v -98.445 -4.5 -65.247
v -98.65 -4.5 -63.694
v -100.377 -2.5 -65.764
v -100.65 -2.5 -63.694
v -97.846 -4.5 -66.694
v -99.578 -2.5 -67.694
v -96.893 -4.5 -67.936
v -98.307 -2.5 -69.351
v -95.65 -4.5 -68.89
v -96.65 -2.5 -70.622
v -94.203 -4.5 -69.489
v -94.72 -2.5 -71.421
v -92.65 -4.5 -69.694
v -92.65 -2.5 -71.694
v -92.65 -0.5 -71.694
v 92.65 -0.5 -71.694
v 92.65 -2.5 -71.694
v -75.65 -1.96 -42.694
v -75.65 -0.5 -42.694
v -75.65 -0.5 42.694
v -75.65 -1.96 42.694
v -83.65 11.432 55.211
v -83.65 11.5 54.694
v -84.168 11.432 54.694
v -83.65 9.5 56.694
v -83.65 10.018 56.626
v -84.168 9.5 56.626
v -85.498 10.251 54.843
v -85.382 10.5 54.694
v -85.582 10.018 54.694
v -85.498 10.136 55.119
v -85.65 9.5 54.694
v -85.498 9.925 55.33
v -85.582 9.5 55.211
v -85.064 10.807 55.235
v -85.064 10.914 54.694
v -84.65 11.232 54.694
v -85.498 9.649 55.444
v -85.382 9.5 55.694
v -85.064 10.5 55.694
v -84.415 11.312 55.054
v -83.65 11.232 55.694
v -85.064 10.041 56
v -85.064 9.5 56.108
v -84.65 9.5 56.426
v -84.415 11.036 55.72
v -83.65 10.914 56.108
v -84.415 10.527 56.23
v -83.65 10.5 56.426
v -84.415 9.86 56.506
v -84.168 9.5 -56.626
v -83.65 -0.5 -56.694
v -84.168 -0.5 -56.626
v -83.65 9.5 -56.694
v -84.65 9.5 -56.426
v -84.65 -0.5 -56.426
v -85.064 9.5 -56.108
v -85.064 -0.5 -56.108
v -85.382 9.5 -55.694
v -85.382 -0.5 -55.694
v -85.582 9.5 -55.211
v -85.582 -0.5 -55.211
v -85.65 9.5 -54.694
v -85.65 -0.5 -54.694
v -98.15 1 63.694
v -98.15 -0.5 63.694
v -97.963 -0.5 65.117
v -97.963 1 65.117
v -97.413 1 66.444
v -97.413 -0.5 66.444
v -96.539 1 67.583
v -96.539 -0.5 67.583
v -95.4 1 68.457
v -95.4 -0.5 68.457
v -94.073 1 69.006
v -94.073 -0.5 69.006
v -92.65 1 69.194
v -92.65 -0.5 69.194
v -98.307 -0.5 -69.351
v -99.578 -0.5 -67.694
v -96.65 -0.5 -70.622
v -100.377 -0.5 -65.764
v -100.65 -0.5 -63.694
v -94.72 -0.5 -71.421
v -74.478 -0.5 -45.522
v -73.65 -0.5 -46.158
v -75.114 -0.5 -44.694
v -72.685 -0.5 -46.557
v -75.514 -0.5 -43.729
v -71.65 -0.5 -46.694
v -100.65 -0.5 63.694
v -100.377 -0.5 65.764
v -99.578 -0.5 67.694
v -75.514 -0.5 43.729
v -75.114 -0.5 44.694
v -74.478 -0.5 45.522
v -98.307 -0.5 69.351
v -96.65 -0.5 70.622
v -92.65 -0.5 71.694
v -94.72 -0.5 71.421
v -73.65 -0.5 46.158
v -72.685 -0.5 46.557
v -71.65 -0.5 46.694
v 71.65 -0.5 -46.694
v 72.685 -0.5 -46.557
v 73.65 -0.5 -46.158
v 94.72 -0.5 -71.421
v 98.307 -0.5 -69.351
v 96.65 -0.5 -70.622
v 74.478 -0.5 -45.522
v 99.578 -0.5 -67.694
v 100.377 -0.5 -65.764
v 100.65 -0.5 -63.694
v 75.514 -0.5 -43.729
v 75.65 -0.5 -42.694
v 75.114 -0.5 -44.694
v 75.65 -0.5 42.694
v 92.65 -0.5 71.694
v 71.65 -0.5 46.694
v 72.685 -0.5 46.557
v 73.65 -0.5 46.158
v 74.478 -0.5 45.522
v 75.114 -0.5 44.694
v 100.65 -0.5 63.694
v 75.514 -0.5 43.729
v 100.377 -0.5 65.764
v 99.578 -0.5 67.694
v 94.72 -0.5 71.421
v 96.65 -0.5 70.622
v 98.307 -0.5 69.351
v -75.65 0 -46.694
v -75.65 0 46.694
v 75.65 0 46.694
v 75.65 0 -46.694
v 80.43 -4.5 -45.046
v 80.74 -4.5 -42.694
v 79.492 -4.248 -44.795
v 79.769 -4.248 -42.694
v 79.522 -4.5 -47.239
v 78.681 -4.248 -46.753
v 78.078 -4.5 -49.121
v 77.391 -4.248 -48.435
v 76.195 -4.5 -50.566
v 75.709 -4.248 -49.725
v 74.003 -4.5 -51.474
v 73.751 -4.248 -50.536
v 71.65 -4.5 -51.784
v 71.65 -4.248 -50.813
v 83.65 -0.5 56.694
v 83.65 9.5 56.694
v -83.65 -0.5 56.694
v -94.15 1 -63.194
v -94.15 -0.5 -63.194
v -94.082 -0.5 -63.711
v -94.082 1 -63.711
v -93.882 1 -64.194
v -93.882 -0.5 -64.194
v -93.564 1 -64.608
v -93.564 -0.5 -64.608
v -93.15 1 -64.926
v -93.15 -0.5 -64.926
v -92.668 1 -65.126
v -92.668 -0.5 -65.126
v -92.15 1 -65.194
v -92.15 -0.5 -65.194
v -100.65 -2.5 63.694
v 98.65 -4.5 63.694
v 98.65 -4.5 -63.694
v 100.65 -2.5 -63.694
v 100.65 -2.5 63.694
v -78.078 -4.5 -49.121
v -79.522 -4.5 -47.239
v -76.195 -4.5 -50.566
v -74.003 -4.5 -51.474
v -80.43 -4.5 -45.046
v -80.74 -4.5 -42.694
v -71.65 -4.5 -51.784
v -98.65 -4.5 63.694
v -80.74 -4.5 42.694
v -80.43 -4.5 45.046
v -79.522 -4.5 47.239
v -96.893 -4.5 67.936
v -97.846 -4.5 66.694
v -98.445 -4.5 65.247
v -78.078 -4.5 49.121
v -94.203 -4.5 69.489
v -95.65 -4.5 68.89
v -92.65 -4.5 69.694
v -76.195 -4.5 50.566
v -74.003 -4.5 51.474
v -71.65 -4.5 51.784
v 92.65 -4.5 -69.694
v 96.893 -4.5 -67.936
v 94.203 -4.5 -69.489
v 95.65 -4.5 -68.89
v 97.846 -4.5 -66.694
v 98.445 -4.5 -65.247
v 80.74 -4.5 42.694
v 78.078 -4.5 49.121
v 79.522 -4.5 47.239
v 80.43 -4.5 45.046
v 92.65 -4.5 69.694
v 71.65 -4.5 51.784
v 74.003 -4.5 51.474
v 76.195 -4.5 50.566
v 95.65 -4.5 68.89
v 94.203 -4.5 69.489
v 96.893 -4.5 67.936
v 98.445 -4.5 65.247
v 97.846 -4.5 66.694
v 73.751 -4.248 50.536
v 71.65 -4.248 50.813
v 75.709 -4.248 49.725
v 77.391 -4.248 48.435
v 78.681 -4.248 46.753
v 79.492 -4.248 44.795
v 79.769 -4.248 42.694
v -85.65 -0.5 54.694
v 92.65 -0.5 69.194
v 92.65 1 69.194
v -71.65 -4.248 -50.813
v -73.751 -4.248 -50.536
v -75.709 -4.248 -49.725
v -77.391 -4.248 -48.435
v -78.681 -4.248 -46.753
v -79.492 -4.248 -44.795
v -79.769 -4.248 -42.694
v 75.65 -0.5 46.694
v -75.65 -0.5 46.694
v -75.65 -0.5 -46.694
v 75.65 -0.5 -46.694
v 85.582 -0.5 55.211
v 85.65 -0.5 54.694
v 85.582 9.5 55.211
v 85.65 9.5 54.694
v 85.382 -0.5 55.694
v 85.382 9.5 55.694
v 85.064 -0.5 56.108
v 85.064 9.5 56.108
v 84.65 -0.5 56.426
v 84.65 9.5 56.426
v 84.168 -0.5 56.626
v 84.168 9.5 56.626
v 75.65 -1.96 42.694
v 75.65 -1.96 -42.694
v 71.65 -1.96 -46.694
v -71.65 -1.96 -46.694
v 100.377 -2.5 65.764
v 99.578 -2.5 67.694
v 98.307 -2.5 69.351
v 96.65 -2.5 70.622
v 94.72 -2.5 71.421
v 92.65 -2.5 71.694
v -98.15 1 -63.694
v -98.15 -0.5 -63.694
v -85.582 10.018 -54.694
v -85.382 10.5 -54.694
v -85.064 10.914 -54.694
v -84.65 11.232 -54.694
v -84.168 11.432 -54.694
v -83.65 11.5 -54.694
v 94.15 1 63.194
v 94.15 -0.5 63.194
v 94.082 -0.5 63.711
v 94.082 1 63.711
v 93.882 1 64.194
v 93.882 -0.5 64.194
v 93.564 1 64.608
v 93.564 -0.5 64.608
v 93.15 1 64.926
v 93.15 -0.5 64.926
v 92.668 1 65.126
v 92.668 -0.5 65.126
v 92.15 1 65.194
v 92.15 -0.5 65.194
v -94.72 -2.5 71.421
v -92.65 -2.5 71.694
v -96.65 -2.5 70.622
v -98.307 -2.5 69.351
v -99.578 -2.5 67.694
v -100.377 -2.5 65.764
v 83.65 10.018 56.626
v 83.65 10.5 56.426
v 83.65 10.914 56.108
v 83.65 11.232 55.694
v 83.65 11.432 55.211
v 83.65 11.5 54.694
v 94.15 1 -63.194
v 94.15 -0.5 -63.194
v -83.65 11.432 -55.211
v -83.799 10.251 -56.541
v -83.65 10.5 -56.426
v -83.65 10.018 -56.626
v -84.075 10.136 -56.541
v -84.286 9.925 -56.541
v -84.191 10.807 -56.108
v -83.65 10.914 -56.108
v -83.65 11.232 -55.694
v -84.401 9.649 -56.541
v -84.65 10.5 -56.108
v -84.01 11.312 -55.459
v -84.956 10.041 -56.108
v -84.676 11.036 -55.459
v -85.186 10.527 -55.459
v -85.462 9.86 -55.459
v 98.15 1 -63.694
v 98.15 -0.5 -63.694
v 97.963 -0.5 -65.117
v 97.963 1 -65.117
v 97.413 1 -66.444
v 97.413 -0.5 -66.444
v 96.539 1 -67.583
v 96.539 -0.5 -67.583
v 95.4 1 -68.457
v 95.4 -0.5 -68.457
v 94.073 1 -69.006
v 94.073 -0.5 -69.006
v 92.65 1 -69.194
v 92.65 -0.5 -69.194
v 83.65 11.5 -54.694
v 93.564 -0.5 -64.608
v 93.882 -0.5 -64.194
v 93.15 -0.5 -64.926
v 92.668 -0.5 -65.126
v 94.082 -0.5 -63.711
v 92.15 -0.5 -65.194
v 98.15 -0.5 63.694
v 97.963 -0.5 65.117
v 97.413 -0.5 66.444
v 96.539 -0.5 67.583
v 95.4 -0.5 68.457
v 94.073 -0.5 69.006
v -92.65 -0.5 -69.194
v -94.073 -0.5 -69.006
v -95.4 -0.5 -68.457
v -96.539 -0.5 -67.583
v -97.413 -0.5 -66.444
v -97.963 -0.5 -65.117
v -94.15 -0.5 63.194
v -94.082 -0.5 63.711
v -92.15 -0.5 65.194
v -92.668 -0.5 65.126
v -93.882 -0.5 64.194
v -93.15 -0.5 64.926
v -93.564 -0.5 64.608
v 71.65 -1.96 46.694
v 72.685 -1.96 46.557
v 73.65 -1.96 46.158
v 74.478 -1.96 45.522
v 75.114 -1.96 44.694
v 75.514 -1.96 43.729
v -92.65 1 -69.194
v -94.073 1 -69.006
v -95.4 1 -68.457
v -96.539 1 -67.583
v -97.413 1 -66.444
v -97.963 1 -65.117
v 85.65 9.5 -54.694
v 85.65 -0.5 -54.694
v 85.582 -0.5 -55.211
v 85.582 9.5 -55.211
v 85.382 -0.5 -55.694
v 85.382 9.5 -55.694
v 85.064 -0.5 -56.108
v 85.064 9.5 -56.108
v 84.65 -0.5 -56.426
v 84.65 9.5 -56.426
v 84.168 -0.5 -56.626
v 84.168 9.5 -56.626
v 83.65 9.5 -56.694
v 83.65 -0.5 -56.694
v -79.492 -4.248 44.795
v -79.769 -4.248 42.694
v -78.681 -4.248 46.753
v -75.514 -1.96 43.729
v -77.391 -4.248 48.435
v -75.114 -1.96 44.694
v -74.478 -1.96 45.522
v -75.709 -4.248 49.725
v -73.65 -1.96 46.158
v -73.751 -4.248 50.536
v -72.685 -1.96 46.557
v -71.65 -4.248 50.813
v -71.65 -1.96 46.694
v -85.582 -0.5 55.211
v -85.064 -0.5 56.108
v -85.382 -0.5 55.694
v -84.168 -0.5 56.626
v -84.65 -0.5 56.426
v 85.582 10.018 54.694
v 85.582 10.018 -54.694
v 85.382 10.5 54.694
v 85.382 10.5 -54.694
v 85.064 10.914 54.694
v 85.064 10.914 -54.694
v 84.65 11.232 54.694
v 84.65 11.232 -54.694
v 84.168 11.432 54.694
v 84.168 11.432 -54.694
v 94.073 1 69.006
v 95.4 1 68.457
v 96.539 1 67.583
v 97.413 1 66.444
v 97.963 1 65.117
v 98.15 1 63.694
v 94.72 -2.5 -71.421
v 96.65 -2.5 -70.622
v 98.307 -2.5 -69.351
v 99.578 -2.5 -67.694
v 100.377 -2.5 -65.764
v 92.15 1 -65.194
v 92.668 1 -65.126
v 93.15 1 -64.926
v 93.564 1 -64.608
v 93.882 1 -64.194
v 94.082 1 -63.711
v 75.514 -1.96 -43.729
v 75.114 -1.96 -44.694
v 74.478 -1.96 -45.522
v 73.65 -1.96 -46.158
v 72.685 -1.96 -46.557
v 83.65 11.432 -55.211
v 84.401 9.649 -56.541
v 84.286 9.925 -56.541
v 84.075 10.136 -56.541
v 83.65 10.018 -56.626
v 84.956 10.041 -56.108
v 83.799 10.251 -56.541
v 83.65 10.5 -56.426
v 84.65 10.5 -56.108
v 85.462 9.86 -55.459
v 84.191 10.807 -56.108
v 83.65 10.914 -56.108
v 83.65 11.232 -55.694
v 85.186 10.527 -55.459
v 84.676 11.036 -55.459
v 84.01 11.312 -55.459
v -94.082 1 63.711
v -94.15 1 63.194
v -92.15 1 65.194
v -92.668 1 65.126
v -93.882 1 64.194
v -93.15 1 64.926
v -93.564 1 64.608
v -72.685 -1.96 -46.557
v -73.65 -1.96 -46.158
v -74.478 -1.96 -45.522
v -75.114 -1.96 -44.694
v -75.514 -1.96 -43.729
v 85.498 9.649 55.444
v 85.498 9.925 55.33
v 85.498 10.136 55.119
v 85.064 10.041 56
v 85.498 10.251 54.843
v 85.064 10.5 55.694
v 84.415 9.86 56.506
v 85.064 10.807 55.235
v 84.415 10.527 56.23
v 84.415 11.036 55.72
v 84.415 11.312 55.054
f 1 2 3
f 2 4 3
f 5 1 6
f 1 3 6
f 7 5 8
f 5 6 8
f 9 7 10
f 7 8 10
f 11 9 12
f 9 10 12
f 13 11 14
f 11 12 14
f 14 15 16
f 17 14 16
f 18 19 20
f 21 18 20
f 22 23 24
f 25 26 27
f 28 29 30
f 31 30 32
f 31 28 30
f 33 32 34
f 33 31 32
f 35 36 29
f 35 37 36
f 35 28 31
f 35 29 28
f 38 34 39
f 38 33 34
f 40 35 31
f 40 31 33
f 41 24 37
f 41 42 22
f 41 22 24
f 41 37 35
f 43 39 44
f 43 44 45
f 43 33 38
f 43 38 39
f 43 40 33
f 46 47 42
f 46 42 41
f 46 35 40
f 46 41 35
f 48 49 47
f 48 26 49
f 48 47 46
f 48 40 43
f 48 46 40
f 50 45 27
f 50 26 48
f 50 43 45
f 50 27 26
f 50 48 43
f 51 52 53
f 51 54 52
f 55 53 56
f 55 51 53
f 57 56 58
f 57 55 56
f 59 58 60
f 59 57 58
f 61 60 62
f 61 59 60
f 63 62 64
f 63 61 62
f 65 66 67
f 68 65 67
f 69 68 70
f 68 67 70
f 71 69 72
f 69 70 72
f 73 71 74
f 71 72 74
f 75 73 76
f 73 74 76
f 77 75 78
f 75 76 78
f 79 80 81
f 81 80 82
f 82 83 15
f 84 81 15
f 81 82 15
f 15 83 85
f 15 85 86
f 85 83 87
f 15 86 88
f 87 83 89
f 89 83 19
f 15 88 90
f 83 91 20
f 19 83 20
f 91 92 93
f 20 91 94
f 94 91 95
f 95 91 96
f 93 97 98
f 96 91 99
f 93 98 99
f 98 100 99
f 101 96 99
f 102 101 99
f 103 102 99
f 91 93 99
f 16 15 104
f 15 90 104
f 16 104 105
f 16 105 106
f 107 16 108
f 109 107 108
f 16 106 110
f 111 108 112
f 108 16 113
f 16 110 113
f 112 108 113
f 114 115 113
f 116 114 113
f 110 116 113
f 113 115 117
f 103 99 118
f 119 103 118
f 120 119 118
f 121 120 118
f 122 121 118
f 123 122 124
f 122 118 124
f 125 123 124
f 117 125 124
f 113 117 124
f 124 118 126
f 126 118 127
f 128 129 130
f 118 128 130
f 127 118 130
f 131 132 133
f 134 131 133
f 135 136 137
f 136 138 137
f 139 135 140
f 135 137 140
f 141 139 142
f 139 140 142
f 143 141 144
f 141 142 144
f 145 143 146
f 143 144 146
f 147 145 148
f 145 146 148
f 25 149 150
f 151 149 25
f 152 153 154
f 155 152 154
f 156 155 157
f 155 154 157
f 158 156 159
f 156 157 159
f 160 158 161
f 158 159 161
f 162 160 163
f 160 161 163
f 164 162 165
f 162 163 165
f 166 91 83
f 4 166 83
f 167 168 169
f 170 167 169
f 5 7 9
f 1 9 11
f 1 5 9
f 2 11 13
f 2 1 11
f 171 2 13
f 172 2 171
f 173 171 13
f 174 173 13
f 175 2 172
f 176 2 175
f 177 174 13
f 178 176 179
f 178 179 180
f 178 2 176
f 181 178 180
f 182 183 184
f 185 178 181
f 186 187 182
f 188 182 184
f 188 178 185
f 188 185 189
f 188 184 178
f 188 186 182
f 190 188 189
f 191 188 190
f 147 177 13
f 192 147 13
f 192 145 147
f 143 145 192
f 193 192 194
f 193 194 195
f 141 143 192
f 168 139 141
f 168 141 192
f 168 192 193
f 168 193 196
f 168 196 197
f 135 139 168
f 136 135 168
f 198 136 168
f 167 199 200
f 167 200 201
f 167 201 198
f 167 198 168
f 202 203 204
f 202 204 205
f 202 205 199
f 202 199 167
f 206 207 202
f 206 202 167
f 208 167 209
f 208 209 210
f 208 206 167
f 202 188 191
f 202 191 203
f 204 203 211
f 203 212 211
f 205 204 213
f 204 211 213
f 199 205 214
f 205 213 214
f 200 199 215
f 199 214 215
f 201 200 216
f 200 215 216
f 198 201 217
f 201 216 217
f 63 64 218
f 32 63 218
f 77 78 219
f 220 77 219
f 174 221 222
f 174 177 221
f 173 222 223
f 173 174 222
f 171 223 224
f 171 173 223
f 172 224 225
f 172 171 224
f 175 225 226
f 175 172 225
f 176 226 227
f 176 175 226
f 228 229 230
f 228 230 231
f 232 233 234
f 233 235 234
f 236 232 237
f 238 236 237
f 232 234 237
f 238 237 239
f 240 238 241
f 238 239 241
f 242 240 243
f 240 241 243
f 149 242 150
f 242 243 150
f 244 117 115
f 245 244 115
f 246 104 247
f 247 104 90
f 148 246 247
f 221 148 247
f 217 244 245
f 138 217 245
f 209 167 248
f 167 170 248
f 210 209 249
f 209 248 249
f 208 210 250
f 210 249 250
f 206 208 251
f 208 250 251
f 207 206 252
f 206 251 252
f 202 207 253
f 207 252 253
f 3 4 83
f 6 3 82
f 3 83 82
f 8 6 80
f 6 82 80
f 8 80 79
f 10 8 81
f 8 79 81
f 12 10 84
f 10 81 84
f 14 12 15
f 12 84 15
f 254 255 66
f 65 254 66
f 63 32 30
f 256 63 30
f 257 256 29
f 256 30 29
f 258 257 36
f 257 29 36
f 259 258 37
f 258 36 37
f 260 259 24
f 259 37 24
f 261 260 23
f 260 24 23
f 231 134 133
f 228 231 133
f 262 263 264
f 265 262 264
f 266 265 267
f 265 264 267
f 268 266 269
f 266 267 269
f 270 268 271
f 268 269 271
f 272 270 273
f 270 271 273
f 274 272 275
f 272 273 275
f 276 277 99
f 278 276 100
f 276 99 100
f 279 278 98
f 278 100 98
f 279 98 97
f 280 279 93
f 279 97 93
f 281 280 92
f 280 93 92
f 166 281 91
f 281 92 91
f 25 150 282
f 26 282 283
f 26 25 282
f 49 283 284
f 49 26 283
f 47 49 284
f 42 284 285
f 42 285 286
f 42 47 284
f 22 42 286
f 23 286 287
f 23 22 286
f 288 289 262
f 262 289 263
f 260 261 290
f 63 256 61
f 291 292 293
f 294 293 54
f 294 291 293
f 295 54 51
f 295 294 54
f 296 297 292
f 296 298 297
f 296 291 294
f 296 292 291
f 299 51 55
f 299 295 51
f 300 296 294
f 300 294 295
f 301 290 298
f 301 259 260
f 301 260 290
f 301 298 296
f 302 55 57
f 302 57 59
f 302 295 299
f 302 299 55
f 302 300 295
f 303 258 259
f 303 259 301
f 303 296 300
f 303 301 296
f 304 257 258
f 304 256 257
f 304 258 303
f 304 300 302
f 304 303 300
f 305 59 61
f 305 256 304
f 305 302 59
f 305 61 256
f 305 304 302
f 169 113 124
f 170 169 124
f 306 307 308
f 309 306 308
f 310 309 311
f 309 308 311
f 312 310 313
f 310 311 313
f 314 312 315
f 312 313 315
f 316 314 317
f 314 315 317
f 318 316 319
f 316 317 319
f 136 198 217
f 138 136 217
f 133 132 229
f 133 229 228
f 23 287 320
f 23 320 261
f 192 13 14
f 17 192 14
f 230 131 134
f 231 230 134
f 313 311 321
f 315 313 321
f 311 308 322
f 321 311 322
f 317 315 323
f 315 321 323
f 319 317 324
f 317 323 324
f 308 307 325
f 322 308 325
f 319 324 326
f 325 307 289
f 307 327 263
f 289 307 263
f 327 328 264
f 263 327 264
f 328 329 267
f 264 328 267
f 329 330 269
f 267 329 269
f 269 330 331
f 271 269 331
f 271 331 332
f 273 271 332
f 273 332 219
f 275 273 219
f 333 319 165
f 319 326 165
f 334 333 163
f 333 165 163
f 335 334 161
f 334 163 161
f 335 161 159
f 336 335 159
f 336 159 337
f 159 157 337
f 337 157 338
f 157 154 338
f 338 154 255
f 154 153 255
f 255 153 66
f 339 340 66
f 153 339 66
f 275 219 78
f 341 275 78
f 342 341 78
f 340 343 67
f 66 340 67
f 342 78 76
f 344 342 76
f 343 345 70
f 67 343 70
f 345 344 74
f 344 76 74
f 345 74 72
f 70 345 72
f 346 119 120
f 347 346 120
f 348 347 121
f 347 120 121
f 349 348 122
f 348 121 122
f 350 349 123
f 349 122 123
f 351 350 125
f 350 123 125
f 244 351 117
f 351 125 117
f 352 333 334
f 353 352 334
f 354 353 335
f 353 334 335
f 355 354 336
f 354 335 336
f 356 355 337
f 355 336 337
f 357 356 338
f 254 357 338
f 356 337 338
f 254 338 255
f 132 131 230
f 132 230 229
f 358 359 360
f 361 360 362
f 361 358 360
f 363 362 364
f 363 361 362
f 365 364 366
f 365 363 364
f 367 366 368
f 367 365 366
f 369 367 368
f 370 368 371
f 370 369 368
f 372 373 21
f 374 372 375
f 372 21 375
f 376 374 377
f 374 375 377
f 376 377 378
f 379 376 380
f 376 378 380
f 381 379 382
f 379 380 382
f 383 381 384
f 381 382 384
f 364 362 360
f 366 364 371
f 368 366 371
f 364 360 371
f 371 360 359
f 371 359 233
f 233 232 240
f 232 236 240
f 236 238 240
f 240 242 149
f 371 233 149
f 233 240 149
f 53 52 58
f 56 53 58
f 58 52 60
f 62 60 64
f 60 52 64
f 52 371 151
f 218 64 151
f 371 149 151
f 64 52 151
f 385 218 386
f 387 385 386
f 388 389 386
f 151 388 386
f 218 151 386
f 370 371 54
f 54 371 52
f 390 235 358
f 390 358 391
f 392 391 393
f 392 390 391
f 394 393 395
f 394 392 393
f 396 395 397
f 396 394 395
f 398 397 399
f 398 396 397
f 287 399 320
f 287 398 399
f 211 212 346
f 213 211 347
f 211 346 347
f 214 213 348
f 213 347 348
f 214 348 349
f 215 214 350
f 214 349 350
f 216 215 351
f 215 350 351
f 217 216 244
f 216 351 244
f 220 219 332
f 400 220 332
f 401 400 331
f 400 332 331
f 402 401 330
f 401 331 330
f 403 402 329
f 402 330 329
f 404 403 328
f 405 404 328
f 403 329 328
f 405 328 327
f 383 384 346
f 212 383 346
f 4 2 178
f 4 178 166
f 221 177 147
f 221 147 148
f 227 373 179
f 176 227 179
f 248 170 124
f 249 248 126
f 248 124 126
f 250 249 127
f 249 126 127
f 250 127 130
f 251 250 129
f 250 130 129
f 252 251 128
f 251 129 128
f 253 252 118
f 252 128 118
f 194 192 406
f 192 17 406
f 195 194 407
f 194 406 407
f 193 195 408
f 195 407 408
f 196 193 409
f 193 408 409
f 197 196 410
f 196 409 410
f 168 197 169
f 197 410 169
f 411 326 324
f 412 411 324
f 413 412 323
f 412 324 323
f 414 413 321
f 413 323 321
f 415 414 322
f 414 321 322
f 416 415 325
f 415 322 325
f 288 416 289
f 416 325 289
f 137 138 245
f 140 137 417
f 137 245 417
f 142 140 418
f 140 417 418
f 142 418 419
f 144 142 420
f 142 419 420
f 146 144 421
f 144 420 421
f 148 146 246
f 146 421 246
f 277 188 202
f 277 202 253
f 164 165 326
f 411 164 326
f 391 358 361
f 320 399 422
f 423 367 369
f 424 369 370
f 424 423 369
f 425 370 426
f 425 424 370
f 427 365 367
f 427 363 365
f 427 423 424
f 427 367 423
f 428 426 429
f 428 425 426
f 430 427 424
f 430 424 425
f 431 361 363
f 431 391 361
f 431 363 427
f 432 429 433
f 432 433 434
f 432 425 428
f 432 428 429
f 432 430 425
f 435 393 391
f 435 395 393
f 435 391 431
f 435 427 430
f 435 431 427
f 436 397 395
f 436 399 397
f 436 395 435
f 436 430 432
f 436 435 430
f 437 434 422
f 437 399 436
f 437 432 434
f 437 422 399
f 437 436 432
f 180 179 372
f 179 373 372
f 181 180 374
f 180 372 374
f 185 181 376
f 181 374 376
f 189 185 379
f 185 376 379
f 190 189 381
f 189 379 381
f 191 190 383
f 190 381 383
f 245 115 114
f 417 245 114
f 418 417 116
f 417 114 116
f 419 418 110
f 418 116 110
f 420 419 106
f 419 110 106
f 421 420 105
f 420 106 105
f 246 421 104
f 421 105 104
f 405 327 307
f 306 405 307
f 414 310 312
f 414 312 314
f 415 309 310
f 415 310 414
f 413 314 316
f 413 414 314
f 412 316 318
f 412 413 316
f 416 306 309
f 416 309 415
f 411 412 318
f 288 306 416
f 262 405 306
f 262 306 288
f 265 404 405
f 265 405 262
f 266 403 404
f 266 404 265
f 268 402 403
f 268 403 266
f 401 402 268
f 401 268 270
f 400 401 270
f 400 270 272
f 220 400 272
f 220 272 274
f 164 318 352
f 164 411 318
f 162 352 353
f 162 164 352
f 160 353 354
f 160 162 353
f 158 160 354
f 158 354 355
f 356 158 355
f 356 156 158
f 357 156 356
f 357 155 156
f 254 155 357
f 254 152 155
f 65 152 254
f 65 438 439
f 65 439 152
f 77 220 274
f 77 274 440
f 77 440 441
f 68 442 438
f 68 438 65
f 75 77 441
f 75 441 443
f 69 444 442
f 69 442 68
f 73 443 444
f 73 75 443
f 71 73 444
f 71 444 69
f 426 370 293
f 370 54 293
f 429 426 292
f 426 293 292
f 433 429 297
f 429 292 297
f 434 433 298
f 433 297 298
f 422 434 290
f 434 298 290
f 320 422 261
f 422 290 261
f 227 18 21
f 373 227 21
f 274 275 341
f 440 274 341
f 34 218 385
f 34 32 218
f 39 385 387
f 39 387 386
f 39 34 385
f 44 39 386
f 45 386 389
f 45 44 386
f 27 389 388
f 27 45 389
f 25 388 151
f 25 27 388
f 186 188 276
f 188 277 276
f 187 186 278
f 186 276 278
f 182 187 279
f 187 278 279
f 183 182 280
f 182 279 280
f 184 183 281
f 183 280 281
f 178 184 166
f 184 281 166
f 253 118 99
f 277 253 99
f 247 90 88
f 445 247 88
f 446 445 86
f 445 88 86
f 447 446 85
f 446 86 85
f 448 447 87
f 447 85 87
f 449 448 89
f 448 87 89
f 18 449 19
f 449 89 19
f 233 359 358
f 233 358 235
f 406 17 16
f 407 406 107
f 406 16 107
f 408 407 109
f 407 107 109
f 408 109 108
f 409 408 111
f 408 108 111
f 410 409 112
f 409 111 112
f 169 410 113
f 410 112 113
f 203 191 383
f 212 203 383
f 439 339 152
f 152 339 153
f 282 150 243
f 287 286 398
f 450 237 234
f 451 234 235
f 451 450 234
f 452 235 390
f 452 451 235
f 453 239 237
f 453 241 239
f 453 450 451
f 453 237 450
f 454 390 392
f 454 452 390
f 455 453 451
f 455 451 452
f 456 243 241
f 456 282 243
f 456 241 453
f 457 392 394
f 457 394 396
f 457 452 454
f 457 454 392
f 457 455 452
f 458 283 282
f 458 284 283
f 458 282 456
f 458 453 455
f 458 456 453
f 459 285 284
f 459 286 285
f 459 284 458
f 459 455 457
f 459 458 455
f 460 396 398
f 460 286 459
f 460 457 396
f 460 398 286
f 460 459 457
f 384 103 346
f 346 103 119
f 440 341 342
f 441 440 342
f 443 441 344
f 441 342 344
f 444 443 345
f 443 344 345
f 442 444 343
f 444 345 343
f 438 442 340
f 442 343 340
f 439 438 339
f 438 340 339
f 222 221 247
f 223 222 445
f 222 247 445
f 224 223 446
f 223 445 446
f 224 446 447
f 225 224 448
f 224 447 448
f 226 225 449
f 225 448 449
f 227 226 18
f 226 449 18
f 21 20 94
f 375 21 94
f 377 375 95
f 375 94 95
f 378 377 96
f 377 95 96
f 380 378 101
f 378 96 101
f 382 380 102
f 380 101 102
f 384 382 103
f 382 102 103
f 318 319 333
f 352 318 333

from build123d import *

# Parameters (mm, degrees)
F0_W         = 151.2998556506
F0_H         = 93.3873314755
F1_DEPTH     = 0.5
F3_DEPTH     = 4
F4_SIZE2     = 2.54
F4_SIZE      = 4.572
F5_T1_DEPTH  = 85.3873314755
F5_T3_DEPTH  = 143.2998556506
F5_T5_DEPTH  = 185.2998556506
F5_T7_DEPTH  = 127.3873314755
F5_T10_ANGLE = 90
F5_T12_ANGLE = 90
F5_T14_ANGLE = 90
F5_T16_ANGLE = 90
F5_T18_ANGLE = 90
F5_T20_ANGLE = 90
F5_T22_ANGLE = 90
F5_T24_ANGLE = 90
F7_DEPTH     = 1.5
F8_W         = 171.2998556506
F8_H         = 113.3873314755
F9_DEPTH     = 12
F10_R        = 2


# Not quite as in the source:
# - a fillet or chamfer that OpenCascade refuses, or shapes differently, is made with other operations: its cross-section is extruded or revolved along the edge and cut away or added


with BuildPart() as f1:
    # F0 (on Front) → F1 (new body)
    with BuildSketch(Plane.XZ):
        Rectangle(F0_W, F0_H)
    extrude(amount=F1_DEPTH)


with BuildPart() as f3:
    # F2 (on face) → F3 (new body)
    with BuildSketch(Plane.XZ.offset(0.5)):
        with BuildLine():
            ThreePointArc((-100.6499278253, -63.6936657378), (-98.3067820748, -69.3505199872), (-92.6499278253, -71.6936657378))
            Line((-92.6499278253, -71.6936657378), (92.6499278253, -71.6936657378))
            ThreePointArc((92.6499278253, -71.6936657378), (98.3067820748, -69.3505199872), (100.6499278253, -63.6936657378))
            Line((100.6499278253, -63.6936657378), (100.6499278253, 63.6936657378))
            ThreePointArc((100.6499278253, 63.6936657378), (98.3067820748, 69.3505199872), (92.6499278253, 71.6936657378))
            Line((92.6499278253, 71.6936657378), (-92.6499278253, 71.6936657378))
            ThreePointArc((-92.6499278253, 71.6936657378), (-98.3067820748, 69.3505199872), (-100.6499278253, 63.6936657378))
            Line((-100.6499278253, 63.6936657378), (-100.6499278253, -63.6936657378))
        make_face()
        Polygon((71.6499278253, -46.6936657378), (-71.6499278253, -46.6936657378), (-75.6499278253, -46.6936657378), (-75.6499278253, -42.6936657378), (-75.6499278253, 42.6936657378), (-75.6499278253, 46.6936657378), (-71.6499278253, 46.6936657378), (71.6499278253, 46.6936657378), (75.6499278253, 46.6936657378), (75.6499278253, 42.6936657378), (75.6499278253, -42.6936657378), (75.6499278253, -46.6936657378), align=None, mode=Mode.SUBTRACT)
        with BuildLine():
            ThreePointArc((71.6499278253, 46.6936657378), (74.47835495, 45.5220928625), (75.6499278253, 42.6936657378))
            Line((75.6499278253, 42.6936657378), (75.6499278253, 46.6936657378))
            Line((75.6499278253, 46.6936657378), (71.6499278253, 46.6936657378))
        make_face()
        with BuildLine():
            Line((-75.6499278253, -46.6936657378), (-71.6499278253, -46.6936657378))
            ThreePointArc((-71.6499278253, -46.6936657378), (-74.47835495, -45.5220928625), (-75.6499278253, -42.6936657378))
            Line((-75.6499278253, -42.6936657378), (-75.6499278253, -46.6936657378))
        make_face()
        with BuildLine():
            ThreePointArc((75.6499278253, -42.6936657378), (74.47835495, -45.5220928625), (71.6499278253, -46.6936657378))
            Line((71.6499278253, -46.6936657378), (75.6499278253, -46.6936657378))
            Line((75.6499278253, -46.6936657378), (75.6499278253, -42.6936657378))
        make_face()
        with BuildLine():
            Line((-75.6499278253, 46.6936657378), (-75.6499278253, 42.6936657378))
            ThreePointArc((-75.6499278253, 42.6936657378), (-74.47835495, 45.5220928625), (-71.6499278253, 46.6936657378))
            Line((-71.6499278253, 46.6936657378), (-75.6499278253, 46.6936657378))
        make_face()
    extrude(amount=F3_DEPTH)

    # F4
    f4_edges = [f3.edges().sort_by_distance(p)[0] for p in [
        (-75.649928, -4.5, 0),
    ]]
    f4_side = f3.faces().sort_by_distance((-96.55919, -4.5, -67.602928))[0]
    chamfer(f4_edges, length=F4_SIZE, length2=F4_SIZE2, reference=f4_side)

    # F5: chamfer of 2 on 16 edges, made by hand

    # F5_s2 → F5_t1 (cut)
    with BuildSketch(Plane.XY.offset(-42.6936657378)):
        Polygon((-79.7688940193, -4.2483145522), (-80.7401798817, -4.5), (-80.2219278253, -4.5), align=None)
        Polygon((80.7401798817, -4.5), (79.7688940193, -4.2483145522), (80.2219278253, -4.5), align=None)
    extrude(amount=F5_T1_DEPTH, mode=Mode.SUBTRACT)

    # F5_s4 → F5_t3 (cut)
    with BuildSketch(Plane.YZ.offset(-71.6499278253)):
        Polygon((-4.5, -51.7839177941), (-4.2483145522, -50.8126319318), (-4.5, -51.2656657378), align=None)
        Polygon((-4.5, 51.7839177941), (-4.2483145522, 50.8126319318), (-4.5, 51.2656657378), align=None)
    extrude(amount=F5_T3_DEPTH, mode=Mode.SUBTRACT)

    # F5_s6 → F5_t5 (cut)
    with BuildSketch(Plane.YZ.offset(-92.6499278253)):
        Polygon((-4.5, -69.6936657378), (-2.5, -71.6936657378), (-4.5, -71.6936657378), align=None)
        Polygon((-4.5, 69.6936657378), (-2.5, 71.6936657378), (-4.5, 71.6936657378), align=None)
    extrude(amount=F5_T5_DEPTH, mode=Mode.SUBTRACT)

    # F5_s8 → F5_t7 (cut)
    with BuildSketch(Plane.XY.offset(-63.6936657378)):
        Polygon((98.6499278253, -4.5), (100.6499278253, -2.5), (100.6499278253, -4.5), align=None)
        Polygon((-98.6499278253, -4.5), (-100.6499278253, -2.5), (-100.6499278253, -4.5), align=None)
    extrude(amount=F5_T7_DEPTH, mode=Mode.SUBTRACT)

    # F5_s9 → F5_t10 (revolve, cut)
    with BuildSketch(Plane.YZ.offset(-71.6499278253)):
        Polygon((-4.2483145522, -50.8126319318), (-4.5, -51.7839177941), (-4.5, -51.2656657378), align=None)
    revolve(axis=Axis((-71.6499278253, -4.5, -42.6936657378), (0, 1, 0)), revolution_arc=F5_T10_ANGLE, mode=Mode.SUBTRACT)

    # F5_s11 → F5_t12 (revolve, cut)
    with BuildSketch(Plane.XY.offset(42.6936657378)):
        Polygon((-80.7401798817, -4.5), (-79.7688940193, -4.2483145522), (-80.2219278253, -4.5), align=None)
    revolve(axis=Axis((-71.6499278253, -4.5, 42.6936657378), (0, 1, 0)), revolution_arc=F5_T12_ANGLE, mode=Mode.SUBTRACT)

    # F5_s13 → F5_t14 (revolve, cut)
    with BuildSketch(Plane.XY.offset(-42.6936657378)):
        Polygon((80.7401798817, -4.5), (79.7688940193, -4.2483145522), (80.2219278253, -4.5), align=None)
    revolve(axis=Axis((71.6499278253, -4.5, -42.6936657378), (0, 1, 0)), revolution_arc=F5_T14_ANGLE, mode=Mode.SUBTRACT)

    # F5_s15 → F5_t16 (revolve, cut)
    with BuildSketch(Plane.YZ.offset(71.6499278253)):
        Polygon((-4.5, 51.7839177941), (-4.2483145522, 50.8126319318), (-4.5, 51.2656657378), align=None)
    revolve(axis=Axis((71.6499278253, -4.5, 42.6936657378), (0, 1, 0)), revolution_arc=F5_T16_ANGLE, mode=Mode.SUBTRACT)

    # F5_s17 → F5_t18 (revolve, cut)
    with BuildSketch(Plane.XY.offset(-63.6936657378)):
        Polygon((-98.6499278253, -4.5), (-100.6499278253, -2.5), (-100.6499278253, -4.5), align=None)
    revolve(axis=Axis((-92.6499278253, -4.5, -63.6936657378), (0, -1, 0)), revolution_arc=F5_T18_ANGLE, mode=Mode.SUBTRACT)

    # F5_s19 → F5_t20 (revolve, cut)
    with BuildSketch(Plane.YZ.offset(92.6499278253)):
        Polygon((-4.5, -69.6936657378), (-2.5, -71.6936657378), (-4.5, -71.6936657378), align=None)
    revolve(axis=Axis((92.6499278253, -4.5, -63.6936657378), (0, -1, 0)), revolution_arc=F5_T20_ANGLE, mode=Mode.SUBTRACT)

    # F5_s21 → F5_t22 (revolve, cut)
    with BuildSketch(Plane.XY.offset(63.6936657378)):
        Polygon((98.6499278253, -4.5), (100.6499278253, -2.5), (100.6499278253, -4.5), align=None)
    revolve(axis=Axis((92.6499278253, -4.5, 63.6936657378), (0, -1, 0)), revolution_arc=F5_T22_ANGLE, mode=Mode.SUBTRACT)

    # F5_s23 → F5_t24 (revolve, cut)
    with BuildSketch(Plane.YZ.offset(-92.6499278253)):
        Polygon((-4.5, 69.6936657378), (-2.5, 71.6936657378), (-4.5, 71.6936657378), align=None)
    revolve(axis=Axis((-92.6499278253, -4.5, 63.6936657378), (0, -1, 0)), revolution_arc=F5_T24_ANGLE, mode=Mode.SUBTRACT)


with BuildPart() as f7:
    # F6 (on face) → F7 (new body)
    with BuildSketch(Plane(origin=(0, -0.5, 0), x_dir=(-1, 0, 0), z_dir=(0, 1, 0))):
        with BuildLine():
            Line((98.1499278253, -63.6936657378), (98.1499278253, 63.6936657378))
            ThreePointArc((98.1499278253, 63.6936657378), (96.5390151218, 67.5827530343), (92.6499278253, 69.1936657378))
            Line((92.6499278253, 69.1936657378), (-92.6499278253, 69.1936657378))
            ThreePointArc((-92.6499278253, 69.1936657378), (-96.5390151218, 67.5827530343), (-98.1499278253, 63.6936657378))
            Line((-98.1499278253, 63.6936657378), (-98.1499278253, -63.6936657378))
            ThreePointArc((-98.1499278253, -63.6936657378), (-96.5390151218, -67.5827530343), (-92.6499278253, -69.1936657378))
            Line((-92.6499278253, -69.1936657378), (92.6499278253, -69.1936657378))
            ThreePointArc((92.6499278253, -69.1936657378), (96.5390151218, -67.5827530343), (98.1499278253, -63.6936657378))
        make_face()
        with BuildLine():
            Line((-92.1499278253, 65.1936657378), (92.1499278253, 65.1936657378))
            ThreePointArc((92.1499278253, 65.1936657378), (93.5641413877, 64.6078793001), (94.1499278253, 63.1936657378))
            Line((94.1499278253, 63.1936657378), (94.1499278253, -63.1936657378))
            ThreePointArc((94.1499278253, -63.1936657378), (93.5641413877, -64.6078793001), (92.1499278253, -65.1936657378))
            Line((92.1499278253, -65.1936657378), (-92.1499278253, -65.1936657378))
            ThreePointArc((-92.1499278253, -65.1936657378), (-93.5641413877, -64.6078793001), (-94.1499278253, -63.1936657378))
            Line((-94.1499278253, -63.1936657378), (-94.1499278253, 63.1936657378))
            ThreePointArc((-94.1499278253, 63.1936657378), (-93.5641413877, 64.6078793001), (-92.1499278253, 65.1936657378))
        make_face(mode=Mode.SUBTRACT)
    extrude(amount=F7_DEPTH)


with BuildPart() as f9:
    # F8 (on face) → F9 (new body)
    with BuildSketch(Plane(origin=(0, -0.5, 0), x_dir=(-1, 0, 0), z_dir=(0, 1, 0))):
        Rectangle(F8_W, F8_H)
    extrude(amount=F9_DEPTH)

    # F10
    f10_edges = [f9.edges().sort_by_distance(p)[0] for p in [
        (0, 11.5, 56.693666),
        (-85.649928, 11.5, 0),
        (-85.649928, 5.5, 56.693666),
        (85.649928, 5.5, 56.693666),
        (85.649928, 11.5, 0),
        (85.649928, 5.5, -56.693666),
        (0, 11.5, -56.693666),
        (-85.649928, 5.5, -56.693666),
    ]]
    fillet(f10_edges, radius=F10_R)


solid = Compound([f1.part, f3.part, f7.part, f9.part])
